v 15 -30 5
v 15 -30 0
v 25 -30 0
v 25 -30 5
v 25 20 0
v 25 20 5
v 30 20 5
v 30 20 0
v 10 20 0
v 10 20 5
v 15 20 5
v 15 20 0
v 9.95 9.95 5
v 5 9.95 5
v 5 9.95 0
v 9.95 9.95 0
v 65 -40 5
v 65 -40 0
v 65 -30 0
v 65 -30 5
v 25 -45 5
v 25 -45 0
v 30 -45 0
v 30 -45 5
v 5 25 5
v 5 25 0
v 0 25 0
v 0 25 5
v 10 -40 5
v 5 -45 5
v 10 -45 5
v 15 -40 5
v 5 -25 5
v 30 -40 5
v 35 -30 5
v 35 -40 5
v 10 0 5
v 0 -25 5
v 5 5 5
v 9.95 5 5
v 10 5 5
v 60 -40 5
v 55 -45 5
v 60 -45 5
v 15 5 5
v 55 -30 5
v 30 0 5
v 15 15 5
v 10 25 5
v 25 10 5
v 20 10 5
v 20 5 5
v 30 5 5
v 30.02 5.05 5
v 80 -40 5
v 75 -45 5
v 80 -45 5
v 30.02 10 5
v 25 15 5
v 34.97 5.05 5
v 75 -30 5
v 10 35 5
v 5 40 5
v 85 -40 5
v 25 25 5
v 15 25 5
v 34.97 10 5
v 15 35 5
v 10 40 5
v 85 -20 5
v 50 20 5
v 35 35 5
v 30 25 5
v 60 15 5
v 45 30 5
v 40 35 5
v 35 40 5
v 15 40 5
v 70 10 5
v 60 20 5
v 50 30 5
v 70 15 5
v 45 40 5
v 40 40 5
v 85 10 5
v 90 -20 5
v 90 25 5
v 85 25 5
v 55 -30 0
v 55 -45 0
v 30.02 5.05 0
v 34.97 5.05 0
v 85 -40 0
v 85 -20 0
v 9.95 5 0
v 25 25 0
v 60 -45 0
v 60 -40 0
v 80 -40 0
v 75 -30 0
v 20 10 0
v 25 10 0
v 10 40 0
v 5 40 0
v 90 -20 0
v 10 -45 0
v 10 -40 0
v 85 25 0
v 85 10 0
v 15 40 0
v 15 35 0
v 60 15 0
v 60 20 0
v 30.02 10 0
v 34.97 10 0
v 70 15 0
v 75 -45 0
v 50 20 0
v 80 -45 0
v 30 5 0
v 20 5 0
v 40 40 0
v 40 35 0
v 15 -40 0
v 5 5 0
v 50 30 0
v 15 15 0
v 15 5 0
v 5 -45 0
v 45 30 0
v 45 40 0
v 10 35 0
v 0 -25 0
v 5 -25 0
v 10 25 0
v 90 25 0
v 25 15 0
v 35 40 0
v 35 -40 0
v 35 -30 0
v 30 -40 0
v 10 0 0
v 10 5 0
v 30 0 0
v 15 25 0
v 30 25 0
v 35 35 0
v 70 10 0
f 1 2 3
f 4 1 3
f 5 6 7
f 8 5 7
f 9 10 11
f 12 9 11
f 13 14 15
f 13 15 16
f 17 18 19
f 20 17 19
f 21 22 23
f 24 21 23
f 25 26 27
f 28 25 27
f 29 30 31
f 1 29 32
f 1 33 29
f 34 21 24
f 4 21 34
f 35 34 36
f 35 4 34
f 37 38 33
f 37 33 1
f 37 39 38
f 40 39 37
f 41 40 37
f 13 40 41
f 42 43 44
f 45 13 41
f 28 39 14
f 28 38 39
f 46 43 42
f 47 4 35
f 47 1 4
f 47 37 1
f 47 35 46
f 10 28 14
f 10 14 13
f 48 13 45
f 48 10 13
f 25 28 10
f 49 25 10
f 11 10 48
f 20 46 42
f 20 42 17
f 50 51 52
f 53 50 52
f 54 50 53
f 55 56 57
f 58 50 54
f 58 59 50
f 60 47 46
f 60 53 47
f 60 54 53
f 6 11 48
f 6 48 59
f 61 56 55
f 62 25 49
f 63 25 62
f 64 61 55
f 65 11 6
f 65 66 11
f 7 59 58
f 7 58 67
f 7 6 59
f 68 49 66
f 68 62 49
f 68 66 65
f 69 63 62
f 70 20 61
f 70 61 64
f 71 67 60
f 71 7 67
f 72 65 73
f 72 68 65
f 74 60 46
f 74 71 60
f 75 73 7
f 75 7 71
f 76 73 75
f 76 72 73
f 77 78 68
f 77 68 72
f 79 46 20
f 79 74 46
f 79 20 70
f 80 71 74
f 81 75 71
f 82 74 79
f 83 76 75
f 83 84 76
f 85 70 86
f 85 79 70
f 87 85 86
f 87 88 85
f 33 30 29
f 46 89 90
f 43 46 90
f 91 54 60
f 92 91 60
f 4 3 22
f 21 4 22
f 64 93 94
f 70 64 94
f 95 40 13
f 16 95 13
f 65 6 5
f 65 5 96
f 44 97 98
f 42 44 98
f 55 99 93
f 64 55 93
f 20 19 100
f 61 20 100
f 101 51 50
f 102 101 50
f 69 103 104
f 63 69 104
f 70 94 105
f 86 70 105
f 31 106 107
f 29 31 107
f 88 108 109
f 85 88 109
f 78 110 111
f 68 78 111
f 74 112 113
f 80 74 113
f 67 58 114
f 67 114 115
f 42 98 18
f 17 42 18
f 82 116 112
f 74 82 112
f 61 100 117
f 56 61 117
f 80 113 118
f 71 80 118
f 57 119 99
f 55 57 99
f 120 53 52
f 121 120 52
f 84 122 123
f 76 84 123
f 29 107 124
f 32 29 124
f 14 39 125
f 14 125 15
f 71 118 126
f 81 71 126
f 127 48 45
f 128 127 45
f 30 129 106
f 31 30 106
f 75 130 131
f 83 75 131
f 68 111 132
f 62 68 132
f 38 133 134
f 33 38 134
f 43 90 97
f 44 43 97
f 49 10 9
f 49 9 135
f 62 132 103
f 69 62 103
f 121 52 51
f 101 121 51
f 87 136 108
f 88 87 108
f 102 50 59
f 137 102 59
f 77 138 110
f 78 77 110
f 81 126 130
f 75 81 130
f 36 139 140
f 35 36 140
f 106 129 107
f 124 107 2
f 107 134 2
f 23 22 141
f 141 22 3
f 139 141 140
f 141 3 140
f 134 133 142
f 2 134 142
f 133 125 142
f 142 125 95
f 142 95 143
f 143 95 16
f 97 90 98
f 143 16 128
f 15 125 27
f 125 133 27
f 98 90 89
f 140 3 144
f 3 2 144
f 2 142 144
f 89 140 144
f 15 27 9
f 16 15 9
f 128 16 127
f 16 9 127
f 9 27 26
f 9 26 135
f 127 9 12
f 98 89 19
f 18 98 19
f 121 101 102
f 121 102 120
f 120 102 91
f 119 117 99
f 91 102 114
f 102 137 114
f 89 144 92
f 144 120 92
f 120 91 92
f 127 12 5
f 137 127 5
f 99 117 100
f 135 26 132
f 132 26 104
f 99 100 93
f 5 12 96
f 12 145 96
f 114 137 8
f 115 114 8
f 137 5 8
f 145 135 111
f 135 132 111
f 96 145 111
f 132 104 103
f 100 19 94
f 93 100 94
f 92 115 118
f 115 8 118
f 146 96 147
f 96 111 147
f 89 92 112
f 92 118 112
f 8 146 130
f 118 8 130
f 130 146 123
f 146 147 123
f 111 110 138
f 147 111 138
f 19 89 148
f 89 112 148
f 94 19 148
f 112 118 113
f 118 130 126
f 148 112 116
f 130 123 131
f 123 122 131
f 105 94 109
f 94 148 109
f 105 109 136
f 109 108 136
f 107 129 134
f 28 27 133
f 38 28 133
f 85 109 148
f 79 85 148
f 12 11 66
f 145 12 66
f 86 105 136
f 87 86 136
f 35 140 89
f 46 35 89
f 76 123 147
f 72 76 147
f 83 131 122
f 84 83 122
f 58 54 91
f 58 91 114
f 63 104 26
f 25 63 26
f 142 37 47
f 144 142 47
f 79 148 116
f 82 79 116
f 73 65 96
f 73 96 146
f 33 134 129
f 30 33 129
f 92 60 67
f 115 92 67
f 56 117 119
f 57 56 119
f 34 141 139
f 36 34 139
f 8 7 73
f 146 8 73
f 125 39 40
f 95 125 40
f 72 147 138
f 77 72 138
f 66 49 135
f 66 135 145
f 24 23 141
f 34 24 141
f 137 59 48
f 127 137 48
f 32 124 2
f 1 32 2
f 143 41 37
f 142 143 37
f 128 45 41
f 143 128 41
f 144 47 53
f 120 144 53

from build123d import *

# Parameters (mm, degrees)
F1_DEPTH  = 5
F3_DEPTH  = 25
F4_W      = 5
F4_H      = 5
F5_DEPTH  = 25
F6_W      = 5
F6_H      = 5
F7_DEPTH  = 25
F8_W      = 4.95
F8_H      = 4.95
F9_DEPTH  = 25
F10_W     = 4.95
F10_H     = 4.95
F11_DEPTH = 25


with BuildPart() as f1:
    # F0 (on Top) → F1 (new body)
    with BuildSketch(Plane.XY):
        Polygon((5, 25), (0, 25), (0, -25), (5, -25), (5, -45), (10, -45), (10, -40), (15, -40), (15, -30), (25, -30), (25, -45), (30, -45), (30, -40), (35, -40), (35, -30), (55, -30), (55, -45), (60, -45), (60, -40), (65, -40), (65, -30), (75, -30), (75, -45), (80, -45), (80, -40), (85, -40), (85, -20), (90, -20), (90, 25), (85, 25), (85, 10), (70, 10), (70, 15), (60, 15), (60, 20), (50, 20), (50, 30), (45, 30), (45, 40), (40, 40), (40, 35), (35, 35), (35, 40), (15, 40), (15, 35), (10, 35), (10, 40), (5, 40), align=None)
    extrude(amount=F1_DEPTH)

    # F2 (on face) → F3 (cut)
    with BuildSketch(Plane.XY.offset(5)):
        Polygon((15, 5), (10, 5), (10, 0), (30, 0), (30, 5), (20, 5), (20, 10), (25, 10), (25, 15), (15, 15), align=None)
    extrude(amount=-F3_DEPTH, mode=Mode.SUBTRACT)

    # F4 (on face) → F5 (cut)
    with BuildSketch(Plane.XY.offset(5)):
        with Locations((12.5, 22.5)):
            Rectangle(F4_W, F4_H)
    extrude(amount=-F5_DEPTH, mode=Mode.SUBTRACT)

    # F6 (on face) → F7 (cut)
    with BuildSketch(Plane.XY.offset(5)):
        with Locations((27.5, 22.5)):
            Rectangle(F6_W, F6_H)
    extrude(amount=-F7_DEPTH, mode=Mode.SUBTRACT)

    # F8 (on face) → F9 (cut)
    with BuildSketch(Plane.XY.offset(5)):
        with Locations((7.475, 7.475)):
            Rectangle(F8_W, F8_H)
    extrude(amount=-F9_DEPTH, mode=Mode.SUBTRACT)

    # F10 (on face) → F11 (cut)
    with BuildSketch(Plane.XY.offset(5)):
        with Locations((32.495, 7.525)):
            Rectangle(F10_W, F10_H)
    extrude(amount=-F11_DEPTH, mode=Mode.SUBTRACT)


solid = f1.part
